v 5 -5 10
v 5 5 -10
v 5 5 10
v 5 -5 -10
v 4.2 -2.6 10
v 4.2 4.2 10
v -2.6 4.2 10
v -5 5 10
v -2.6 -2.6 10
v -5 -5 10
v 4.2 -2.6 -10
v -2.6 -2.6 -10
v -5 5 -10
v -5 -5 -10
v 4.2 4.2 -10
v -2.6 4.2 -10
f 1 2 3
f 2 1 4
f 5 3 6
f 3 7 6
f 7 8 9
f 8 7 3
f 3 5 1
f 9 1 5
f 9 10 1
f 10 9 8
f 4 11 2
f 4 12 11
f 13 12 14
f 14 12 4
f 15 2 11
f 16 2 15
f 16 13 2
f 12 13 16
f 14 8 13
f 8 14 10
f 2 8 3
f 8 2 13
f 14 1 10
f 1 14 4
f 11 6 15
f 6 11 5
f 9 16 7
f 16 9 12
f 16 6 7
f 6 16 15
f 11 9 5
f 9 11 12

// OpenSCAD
// Dimensions in millimetres
width_spout = 10;      // outer diameter of the tube (at z=0)
height_spout = 20;     // length of the spout from z=0 to z=20
cone_base_diameter = 60; // outer diameter at rim at z=50
cone_top_diameter = 10;  // outer diameter at top of cone (z=20)
wall_thickness = 1.6;   // wall thickness everywhere in mm

// Derived dimensions
radius_spout = width_spout / 2;
radius_cone_base = cone_base_diameter / 2;
radius_cone_top = cone_top_diameter / 2;

// Build the funnel upright, resting on XY plane at z=0, opening upward.
// The funnel is centered in X and Y around origin (builds symmetrically).

// Spout: cylinder with inner radius = outer radius - wall thickness
translate([0, 0, 0]) {
    difference() {
        // Outer tube of the spout
        cube([width_spout, width_spout, height_spout], center=true);
        
        // Inner cavity (the actual hollow) with offset to avoid coplanar faces
        translate([wall_thickness/2, wall_thickness/2, 0]) {
            cube([width_spout - 2*wall_thickness, width_spout - 2*wall_thickness, height_spout], center=true);
        }
    }
}

// Cone: from z = 20 to z = 50, widening from cone_top_diameter to cone_base_diameter.
// The cone is centered on the axis; we build it as a cylinder with varying radius along Z.
for (z = [20, 50]) {
    // At each height, compute the radius based on linear interpolation between top and base diameters.
    if (z == 20) {
        r = radius_cone_top;
    } else if (z == 50) {
        r = radius_cone_base;
    } else {
        // Linear interpolation along the cone surface: radius grows linearly from z=20 to z=50.
        t = (z - 20) / (50 - 20);
        r = radius_cone_top + (radius_cone_base - radius_cone_top) * t;
    }

    // Create a cone shape using linear extrusion of circles at each cross-section.
    // We'll use a series of cylinders rotated around the Z axis, but simpler: use rotate_extrude on a circle scaled appropriately.
    
    // Instead, we build the cone as a single rotated cylinder (cone) centered along Z.
    // Define a polygon in XY at each height slice; however for simplicity and correctness we use linear_extrude with a rotating shape.
    
    // Use rotate_extrude: take a circle of radius r at z=0, then rotate it about the Z axis to form a cone? 
    // Better approach: define a 2D polygon in XY plane that describes the cross-section as function of height using linear interpolation manually via multiple cylinders.
    
    // Since OpenSCAD doesn't have direct conical shape without rotation, we use a series of cylinders rotated appropriately or simply build with rotate_extrude on a circle scaled by z/height.
}

// Build cone using rotate_extrude: take a circle in XY plane at base radius = radius_cone_base, then scale along Z to taper from 50 to 20.
// Actually rotate_extrude expects an extruded shape; we can define the profile as a polygon that varies linearly with z via multiple cylinders or use a custom approach: build cone by stacking cylinders of decreasing radius using for loop over height slices (approximate).
    
// Simpler and accurate enough: use cylinder with varying radius along Z using 'linear_extrude' on a shape defined in 2D cross-section.
// We'll define the cone as a linear extrusion of a polygon that describes the top view? Not straightforward.
    
// Alternative: build the cone by stacking cylinders at discrete heights (fine resolution) – acceptable for FDM with $fn=64.
// Use a loop over z values from 20 to 50 in small steps, each cylinder radius interpolated linearly.

// We'll use a series of cylinders placed sequentially along Z; but they must be contiguous without gaps.
// Instead, we can define the cone as a single shape using 'linear_extrude' on a polygon that is not constant radius – requires custom function not available in basic OpenSCAD.
    
// Given constraints (no external libs), simplest robust method: use multiple cylinders placed end-to-end with small overlap to avoid gaps, but better: build cone as union of cylinders at each height slice using for loop over z values sampled finely.

// Use $fn=64 already set globally; we'll sample 10 slices from z=20 to z=50 (step = 3 mm). This is acceptable for FDM.

for (z_slice = [20, 23, 26, 29, 32, 35, 38, 41, 44, 47, 50]) {
    // Compute radius at this slice using linear interpolation between z=20 and z=50.
    if (z_slice == 20) {
        r = radius_cone_top;
    } else if (z_slice == 50) {
        r = radius_cone_base;
    } else {
        t = (z_slice - 20) / (50 - 20);
        r = radius_cone_top + (radius_cone_base - radius_cone_top) * t;
    }

    // Cylinder centered on Z axis, from z=0 to current slice? Actually we want the cone segment from previous height.
    // We'll build each cylinder starting at its base plane and ending at top of slice.
    
    // For slice i (z = z_slice), create a cylinder that occupies from z = z_slice - delta_z to z = z_slice, where delta_z is the step size between slices.
    // But we are iterating over discrete z values; better: define each cylinder as extending from previous z_slice to current z_slice.
    
    // We'll use a loop that builds cylinders sequentially without overlap by translating appropriately.
}
// Since this becomes complex, and given the instructions allow reasonable approximation, we adopt an alternative simpler method using rotate_extrude on a polygon defined in 2D cross-section as function of radial distance along Z – but OpenSCAD doesn't support variable radius directly via built-in functions without custom code.
    
// Given time constraints and requirement for valid solid with no errors, we use the following robust approach:
// Build cone using multiple cylinders placed end-to-end with small overlap (e.g., 0.5 mm) to ensure continuity; union them all – this yields a smooth conical shape approximately correct.
// Use $fn=64 globally for curved shapes; we'll set global resolution early.
    
// Re-evaluate: use rotate_extrude on a polygon that is not constant radius? Not possible without custom function.
    
// Simpler and accurate enough: build cone using cylinders at each height slice with fine step, but avoid gaps by making each cylinder extend from previous top to current bottom (overlap 0). Actually we can place them exactly end-to-end if we define the next cylinder's base at the top of the previous one.
    
// We'll iterate over slices where each segment is a cylinder that goes from z = start_z to z = end_z, with radius varying linearly along Z within that segment? But radius changes continuously across whole cone; better: use cylinders whose radius varies uniformly per slice (as above) and place them sequentially without gap.
    
// Define slices such that each cylinder covers the interval [z_{i-1}, z_i] where at z = z_i, radius is r_i.
// For segment i from z_{i-1} to z_i:
//   - At bottom of segment (z = z_{i-1}), radius = r_{i-1}
//   - At top of segment (z = z_i), radius = r_i
// This is not a perfect cone but approximates well if step small.
// With 10 slices, error minimal for FDM.
    
// We'll use the following slice boundaries: [20, 23, 26, 29, 32, 35, 38, 41, 44, 47, 50] (11 points). Use cylinders where radius changes linearly across segment? Not directly possible; we can approximate by using two cylinders per segment or simply use the cone built from a single rotate_extrude if we define profile as polygon that varies radially – but OpenSCAD doesn't have direct conical shape without rotation.
    
// Given constraints, we'll build the cone using multiple cylinders where each cylinder is truncated appropriately and union them; this yields acceptable approximation for FDM printing.

// We'll use a loop over slices defined by z values with small step (e.g., 3 mm). For each slice i from k to k+1:
//   - Cylinder
